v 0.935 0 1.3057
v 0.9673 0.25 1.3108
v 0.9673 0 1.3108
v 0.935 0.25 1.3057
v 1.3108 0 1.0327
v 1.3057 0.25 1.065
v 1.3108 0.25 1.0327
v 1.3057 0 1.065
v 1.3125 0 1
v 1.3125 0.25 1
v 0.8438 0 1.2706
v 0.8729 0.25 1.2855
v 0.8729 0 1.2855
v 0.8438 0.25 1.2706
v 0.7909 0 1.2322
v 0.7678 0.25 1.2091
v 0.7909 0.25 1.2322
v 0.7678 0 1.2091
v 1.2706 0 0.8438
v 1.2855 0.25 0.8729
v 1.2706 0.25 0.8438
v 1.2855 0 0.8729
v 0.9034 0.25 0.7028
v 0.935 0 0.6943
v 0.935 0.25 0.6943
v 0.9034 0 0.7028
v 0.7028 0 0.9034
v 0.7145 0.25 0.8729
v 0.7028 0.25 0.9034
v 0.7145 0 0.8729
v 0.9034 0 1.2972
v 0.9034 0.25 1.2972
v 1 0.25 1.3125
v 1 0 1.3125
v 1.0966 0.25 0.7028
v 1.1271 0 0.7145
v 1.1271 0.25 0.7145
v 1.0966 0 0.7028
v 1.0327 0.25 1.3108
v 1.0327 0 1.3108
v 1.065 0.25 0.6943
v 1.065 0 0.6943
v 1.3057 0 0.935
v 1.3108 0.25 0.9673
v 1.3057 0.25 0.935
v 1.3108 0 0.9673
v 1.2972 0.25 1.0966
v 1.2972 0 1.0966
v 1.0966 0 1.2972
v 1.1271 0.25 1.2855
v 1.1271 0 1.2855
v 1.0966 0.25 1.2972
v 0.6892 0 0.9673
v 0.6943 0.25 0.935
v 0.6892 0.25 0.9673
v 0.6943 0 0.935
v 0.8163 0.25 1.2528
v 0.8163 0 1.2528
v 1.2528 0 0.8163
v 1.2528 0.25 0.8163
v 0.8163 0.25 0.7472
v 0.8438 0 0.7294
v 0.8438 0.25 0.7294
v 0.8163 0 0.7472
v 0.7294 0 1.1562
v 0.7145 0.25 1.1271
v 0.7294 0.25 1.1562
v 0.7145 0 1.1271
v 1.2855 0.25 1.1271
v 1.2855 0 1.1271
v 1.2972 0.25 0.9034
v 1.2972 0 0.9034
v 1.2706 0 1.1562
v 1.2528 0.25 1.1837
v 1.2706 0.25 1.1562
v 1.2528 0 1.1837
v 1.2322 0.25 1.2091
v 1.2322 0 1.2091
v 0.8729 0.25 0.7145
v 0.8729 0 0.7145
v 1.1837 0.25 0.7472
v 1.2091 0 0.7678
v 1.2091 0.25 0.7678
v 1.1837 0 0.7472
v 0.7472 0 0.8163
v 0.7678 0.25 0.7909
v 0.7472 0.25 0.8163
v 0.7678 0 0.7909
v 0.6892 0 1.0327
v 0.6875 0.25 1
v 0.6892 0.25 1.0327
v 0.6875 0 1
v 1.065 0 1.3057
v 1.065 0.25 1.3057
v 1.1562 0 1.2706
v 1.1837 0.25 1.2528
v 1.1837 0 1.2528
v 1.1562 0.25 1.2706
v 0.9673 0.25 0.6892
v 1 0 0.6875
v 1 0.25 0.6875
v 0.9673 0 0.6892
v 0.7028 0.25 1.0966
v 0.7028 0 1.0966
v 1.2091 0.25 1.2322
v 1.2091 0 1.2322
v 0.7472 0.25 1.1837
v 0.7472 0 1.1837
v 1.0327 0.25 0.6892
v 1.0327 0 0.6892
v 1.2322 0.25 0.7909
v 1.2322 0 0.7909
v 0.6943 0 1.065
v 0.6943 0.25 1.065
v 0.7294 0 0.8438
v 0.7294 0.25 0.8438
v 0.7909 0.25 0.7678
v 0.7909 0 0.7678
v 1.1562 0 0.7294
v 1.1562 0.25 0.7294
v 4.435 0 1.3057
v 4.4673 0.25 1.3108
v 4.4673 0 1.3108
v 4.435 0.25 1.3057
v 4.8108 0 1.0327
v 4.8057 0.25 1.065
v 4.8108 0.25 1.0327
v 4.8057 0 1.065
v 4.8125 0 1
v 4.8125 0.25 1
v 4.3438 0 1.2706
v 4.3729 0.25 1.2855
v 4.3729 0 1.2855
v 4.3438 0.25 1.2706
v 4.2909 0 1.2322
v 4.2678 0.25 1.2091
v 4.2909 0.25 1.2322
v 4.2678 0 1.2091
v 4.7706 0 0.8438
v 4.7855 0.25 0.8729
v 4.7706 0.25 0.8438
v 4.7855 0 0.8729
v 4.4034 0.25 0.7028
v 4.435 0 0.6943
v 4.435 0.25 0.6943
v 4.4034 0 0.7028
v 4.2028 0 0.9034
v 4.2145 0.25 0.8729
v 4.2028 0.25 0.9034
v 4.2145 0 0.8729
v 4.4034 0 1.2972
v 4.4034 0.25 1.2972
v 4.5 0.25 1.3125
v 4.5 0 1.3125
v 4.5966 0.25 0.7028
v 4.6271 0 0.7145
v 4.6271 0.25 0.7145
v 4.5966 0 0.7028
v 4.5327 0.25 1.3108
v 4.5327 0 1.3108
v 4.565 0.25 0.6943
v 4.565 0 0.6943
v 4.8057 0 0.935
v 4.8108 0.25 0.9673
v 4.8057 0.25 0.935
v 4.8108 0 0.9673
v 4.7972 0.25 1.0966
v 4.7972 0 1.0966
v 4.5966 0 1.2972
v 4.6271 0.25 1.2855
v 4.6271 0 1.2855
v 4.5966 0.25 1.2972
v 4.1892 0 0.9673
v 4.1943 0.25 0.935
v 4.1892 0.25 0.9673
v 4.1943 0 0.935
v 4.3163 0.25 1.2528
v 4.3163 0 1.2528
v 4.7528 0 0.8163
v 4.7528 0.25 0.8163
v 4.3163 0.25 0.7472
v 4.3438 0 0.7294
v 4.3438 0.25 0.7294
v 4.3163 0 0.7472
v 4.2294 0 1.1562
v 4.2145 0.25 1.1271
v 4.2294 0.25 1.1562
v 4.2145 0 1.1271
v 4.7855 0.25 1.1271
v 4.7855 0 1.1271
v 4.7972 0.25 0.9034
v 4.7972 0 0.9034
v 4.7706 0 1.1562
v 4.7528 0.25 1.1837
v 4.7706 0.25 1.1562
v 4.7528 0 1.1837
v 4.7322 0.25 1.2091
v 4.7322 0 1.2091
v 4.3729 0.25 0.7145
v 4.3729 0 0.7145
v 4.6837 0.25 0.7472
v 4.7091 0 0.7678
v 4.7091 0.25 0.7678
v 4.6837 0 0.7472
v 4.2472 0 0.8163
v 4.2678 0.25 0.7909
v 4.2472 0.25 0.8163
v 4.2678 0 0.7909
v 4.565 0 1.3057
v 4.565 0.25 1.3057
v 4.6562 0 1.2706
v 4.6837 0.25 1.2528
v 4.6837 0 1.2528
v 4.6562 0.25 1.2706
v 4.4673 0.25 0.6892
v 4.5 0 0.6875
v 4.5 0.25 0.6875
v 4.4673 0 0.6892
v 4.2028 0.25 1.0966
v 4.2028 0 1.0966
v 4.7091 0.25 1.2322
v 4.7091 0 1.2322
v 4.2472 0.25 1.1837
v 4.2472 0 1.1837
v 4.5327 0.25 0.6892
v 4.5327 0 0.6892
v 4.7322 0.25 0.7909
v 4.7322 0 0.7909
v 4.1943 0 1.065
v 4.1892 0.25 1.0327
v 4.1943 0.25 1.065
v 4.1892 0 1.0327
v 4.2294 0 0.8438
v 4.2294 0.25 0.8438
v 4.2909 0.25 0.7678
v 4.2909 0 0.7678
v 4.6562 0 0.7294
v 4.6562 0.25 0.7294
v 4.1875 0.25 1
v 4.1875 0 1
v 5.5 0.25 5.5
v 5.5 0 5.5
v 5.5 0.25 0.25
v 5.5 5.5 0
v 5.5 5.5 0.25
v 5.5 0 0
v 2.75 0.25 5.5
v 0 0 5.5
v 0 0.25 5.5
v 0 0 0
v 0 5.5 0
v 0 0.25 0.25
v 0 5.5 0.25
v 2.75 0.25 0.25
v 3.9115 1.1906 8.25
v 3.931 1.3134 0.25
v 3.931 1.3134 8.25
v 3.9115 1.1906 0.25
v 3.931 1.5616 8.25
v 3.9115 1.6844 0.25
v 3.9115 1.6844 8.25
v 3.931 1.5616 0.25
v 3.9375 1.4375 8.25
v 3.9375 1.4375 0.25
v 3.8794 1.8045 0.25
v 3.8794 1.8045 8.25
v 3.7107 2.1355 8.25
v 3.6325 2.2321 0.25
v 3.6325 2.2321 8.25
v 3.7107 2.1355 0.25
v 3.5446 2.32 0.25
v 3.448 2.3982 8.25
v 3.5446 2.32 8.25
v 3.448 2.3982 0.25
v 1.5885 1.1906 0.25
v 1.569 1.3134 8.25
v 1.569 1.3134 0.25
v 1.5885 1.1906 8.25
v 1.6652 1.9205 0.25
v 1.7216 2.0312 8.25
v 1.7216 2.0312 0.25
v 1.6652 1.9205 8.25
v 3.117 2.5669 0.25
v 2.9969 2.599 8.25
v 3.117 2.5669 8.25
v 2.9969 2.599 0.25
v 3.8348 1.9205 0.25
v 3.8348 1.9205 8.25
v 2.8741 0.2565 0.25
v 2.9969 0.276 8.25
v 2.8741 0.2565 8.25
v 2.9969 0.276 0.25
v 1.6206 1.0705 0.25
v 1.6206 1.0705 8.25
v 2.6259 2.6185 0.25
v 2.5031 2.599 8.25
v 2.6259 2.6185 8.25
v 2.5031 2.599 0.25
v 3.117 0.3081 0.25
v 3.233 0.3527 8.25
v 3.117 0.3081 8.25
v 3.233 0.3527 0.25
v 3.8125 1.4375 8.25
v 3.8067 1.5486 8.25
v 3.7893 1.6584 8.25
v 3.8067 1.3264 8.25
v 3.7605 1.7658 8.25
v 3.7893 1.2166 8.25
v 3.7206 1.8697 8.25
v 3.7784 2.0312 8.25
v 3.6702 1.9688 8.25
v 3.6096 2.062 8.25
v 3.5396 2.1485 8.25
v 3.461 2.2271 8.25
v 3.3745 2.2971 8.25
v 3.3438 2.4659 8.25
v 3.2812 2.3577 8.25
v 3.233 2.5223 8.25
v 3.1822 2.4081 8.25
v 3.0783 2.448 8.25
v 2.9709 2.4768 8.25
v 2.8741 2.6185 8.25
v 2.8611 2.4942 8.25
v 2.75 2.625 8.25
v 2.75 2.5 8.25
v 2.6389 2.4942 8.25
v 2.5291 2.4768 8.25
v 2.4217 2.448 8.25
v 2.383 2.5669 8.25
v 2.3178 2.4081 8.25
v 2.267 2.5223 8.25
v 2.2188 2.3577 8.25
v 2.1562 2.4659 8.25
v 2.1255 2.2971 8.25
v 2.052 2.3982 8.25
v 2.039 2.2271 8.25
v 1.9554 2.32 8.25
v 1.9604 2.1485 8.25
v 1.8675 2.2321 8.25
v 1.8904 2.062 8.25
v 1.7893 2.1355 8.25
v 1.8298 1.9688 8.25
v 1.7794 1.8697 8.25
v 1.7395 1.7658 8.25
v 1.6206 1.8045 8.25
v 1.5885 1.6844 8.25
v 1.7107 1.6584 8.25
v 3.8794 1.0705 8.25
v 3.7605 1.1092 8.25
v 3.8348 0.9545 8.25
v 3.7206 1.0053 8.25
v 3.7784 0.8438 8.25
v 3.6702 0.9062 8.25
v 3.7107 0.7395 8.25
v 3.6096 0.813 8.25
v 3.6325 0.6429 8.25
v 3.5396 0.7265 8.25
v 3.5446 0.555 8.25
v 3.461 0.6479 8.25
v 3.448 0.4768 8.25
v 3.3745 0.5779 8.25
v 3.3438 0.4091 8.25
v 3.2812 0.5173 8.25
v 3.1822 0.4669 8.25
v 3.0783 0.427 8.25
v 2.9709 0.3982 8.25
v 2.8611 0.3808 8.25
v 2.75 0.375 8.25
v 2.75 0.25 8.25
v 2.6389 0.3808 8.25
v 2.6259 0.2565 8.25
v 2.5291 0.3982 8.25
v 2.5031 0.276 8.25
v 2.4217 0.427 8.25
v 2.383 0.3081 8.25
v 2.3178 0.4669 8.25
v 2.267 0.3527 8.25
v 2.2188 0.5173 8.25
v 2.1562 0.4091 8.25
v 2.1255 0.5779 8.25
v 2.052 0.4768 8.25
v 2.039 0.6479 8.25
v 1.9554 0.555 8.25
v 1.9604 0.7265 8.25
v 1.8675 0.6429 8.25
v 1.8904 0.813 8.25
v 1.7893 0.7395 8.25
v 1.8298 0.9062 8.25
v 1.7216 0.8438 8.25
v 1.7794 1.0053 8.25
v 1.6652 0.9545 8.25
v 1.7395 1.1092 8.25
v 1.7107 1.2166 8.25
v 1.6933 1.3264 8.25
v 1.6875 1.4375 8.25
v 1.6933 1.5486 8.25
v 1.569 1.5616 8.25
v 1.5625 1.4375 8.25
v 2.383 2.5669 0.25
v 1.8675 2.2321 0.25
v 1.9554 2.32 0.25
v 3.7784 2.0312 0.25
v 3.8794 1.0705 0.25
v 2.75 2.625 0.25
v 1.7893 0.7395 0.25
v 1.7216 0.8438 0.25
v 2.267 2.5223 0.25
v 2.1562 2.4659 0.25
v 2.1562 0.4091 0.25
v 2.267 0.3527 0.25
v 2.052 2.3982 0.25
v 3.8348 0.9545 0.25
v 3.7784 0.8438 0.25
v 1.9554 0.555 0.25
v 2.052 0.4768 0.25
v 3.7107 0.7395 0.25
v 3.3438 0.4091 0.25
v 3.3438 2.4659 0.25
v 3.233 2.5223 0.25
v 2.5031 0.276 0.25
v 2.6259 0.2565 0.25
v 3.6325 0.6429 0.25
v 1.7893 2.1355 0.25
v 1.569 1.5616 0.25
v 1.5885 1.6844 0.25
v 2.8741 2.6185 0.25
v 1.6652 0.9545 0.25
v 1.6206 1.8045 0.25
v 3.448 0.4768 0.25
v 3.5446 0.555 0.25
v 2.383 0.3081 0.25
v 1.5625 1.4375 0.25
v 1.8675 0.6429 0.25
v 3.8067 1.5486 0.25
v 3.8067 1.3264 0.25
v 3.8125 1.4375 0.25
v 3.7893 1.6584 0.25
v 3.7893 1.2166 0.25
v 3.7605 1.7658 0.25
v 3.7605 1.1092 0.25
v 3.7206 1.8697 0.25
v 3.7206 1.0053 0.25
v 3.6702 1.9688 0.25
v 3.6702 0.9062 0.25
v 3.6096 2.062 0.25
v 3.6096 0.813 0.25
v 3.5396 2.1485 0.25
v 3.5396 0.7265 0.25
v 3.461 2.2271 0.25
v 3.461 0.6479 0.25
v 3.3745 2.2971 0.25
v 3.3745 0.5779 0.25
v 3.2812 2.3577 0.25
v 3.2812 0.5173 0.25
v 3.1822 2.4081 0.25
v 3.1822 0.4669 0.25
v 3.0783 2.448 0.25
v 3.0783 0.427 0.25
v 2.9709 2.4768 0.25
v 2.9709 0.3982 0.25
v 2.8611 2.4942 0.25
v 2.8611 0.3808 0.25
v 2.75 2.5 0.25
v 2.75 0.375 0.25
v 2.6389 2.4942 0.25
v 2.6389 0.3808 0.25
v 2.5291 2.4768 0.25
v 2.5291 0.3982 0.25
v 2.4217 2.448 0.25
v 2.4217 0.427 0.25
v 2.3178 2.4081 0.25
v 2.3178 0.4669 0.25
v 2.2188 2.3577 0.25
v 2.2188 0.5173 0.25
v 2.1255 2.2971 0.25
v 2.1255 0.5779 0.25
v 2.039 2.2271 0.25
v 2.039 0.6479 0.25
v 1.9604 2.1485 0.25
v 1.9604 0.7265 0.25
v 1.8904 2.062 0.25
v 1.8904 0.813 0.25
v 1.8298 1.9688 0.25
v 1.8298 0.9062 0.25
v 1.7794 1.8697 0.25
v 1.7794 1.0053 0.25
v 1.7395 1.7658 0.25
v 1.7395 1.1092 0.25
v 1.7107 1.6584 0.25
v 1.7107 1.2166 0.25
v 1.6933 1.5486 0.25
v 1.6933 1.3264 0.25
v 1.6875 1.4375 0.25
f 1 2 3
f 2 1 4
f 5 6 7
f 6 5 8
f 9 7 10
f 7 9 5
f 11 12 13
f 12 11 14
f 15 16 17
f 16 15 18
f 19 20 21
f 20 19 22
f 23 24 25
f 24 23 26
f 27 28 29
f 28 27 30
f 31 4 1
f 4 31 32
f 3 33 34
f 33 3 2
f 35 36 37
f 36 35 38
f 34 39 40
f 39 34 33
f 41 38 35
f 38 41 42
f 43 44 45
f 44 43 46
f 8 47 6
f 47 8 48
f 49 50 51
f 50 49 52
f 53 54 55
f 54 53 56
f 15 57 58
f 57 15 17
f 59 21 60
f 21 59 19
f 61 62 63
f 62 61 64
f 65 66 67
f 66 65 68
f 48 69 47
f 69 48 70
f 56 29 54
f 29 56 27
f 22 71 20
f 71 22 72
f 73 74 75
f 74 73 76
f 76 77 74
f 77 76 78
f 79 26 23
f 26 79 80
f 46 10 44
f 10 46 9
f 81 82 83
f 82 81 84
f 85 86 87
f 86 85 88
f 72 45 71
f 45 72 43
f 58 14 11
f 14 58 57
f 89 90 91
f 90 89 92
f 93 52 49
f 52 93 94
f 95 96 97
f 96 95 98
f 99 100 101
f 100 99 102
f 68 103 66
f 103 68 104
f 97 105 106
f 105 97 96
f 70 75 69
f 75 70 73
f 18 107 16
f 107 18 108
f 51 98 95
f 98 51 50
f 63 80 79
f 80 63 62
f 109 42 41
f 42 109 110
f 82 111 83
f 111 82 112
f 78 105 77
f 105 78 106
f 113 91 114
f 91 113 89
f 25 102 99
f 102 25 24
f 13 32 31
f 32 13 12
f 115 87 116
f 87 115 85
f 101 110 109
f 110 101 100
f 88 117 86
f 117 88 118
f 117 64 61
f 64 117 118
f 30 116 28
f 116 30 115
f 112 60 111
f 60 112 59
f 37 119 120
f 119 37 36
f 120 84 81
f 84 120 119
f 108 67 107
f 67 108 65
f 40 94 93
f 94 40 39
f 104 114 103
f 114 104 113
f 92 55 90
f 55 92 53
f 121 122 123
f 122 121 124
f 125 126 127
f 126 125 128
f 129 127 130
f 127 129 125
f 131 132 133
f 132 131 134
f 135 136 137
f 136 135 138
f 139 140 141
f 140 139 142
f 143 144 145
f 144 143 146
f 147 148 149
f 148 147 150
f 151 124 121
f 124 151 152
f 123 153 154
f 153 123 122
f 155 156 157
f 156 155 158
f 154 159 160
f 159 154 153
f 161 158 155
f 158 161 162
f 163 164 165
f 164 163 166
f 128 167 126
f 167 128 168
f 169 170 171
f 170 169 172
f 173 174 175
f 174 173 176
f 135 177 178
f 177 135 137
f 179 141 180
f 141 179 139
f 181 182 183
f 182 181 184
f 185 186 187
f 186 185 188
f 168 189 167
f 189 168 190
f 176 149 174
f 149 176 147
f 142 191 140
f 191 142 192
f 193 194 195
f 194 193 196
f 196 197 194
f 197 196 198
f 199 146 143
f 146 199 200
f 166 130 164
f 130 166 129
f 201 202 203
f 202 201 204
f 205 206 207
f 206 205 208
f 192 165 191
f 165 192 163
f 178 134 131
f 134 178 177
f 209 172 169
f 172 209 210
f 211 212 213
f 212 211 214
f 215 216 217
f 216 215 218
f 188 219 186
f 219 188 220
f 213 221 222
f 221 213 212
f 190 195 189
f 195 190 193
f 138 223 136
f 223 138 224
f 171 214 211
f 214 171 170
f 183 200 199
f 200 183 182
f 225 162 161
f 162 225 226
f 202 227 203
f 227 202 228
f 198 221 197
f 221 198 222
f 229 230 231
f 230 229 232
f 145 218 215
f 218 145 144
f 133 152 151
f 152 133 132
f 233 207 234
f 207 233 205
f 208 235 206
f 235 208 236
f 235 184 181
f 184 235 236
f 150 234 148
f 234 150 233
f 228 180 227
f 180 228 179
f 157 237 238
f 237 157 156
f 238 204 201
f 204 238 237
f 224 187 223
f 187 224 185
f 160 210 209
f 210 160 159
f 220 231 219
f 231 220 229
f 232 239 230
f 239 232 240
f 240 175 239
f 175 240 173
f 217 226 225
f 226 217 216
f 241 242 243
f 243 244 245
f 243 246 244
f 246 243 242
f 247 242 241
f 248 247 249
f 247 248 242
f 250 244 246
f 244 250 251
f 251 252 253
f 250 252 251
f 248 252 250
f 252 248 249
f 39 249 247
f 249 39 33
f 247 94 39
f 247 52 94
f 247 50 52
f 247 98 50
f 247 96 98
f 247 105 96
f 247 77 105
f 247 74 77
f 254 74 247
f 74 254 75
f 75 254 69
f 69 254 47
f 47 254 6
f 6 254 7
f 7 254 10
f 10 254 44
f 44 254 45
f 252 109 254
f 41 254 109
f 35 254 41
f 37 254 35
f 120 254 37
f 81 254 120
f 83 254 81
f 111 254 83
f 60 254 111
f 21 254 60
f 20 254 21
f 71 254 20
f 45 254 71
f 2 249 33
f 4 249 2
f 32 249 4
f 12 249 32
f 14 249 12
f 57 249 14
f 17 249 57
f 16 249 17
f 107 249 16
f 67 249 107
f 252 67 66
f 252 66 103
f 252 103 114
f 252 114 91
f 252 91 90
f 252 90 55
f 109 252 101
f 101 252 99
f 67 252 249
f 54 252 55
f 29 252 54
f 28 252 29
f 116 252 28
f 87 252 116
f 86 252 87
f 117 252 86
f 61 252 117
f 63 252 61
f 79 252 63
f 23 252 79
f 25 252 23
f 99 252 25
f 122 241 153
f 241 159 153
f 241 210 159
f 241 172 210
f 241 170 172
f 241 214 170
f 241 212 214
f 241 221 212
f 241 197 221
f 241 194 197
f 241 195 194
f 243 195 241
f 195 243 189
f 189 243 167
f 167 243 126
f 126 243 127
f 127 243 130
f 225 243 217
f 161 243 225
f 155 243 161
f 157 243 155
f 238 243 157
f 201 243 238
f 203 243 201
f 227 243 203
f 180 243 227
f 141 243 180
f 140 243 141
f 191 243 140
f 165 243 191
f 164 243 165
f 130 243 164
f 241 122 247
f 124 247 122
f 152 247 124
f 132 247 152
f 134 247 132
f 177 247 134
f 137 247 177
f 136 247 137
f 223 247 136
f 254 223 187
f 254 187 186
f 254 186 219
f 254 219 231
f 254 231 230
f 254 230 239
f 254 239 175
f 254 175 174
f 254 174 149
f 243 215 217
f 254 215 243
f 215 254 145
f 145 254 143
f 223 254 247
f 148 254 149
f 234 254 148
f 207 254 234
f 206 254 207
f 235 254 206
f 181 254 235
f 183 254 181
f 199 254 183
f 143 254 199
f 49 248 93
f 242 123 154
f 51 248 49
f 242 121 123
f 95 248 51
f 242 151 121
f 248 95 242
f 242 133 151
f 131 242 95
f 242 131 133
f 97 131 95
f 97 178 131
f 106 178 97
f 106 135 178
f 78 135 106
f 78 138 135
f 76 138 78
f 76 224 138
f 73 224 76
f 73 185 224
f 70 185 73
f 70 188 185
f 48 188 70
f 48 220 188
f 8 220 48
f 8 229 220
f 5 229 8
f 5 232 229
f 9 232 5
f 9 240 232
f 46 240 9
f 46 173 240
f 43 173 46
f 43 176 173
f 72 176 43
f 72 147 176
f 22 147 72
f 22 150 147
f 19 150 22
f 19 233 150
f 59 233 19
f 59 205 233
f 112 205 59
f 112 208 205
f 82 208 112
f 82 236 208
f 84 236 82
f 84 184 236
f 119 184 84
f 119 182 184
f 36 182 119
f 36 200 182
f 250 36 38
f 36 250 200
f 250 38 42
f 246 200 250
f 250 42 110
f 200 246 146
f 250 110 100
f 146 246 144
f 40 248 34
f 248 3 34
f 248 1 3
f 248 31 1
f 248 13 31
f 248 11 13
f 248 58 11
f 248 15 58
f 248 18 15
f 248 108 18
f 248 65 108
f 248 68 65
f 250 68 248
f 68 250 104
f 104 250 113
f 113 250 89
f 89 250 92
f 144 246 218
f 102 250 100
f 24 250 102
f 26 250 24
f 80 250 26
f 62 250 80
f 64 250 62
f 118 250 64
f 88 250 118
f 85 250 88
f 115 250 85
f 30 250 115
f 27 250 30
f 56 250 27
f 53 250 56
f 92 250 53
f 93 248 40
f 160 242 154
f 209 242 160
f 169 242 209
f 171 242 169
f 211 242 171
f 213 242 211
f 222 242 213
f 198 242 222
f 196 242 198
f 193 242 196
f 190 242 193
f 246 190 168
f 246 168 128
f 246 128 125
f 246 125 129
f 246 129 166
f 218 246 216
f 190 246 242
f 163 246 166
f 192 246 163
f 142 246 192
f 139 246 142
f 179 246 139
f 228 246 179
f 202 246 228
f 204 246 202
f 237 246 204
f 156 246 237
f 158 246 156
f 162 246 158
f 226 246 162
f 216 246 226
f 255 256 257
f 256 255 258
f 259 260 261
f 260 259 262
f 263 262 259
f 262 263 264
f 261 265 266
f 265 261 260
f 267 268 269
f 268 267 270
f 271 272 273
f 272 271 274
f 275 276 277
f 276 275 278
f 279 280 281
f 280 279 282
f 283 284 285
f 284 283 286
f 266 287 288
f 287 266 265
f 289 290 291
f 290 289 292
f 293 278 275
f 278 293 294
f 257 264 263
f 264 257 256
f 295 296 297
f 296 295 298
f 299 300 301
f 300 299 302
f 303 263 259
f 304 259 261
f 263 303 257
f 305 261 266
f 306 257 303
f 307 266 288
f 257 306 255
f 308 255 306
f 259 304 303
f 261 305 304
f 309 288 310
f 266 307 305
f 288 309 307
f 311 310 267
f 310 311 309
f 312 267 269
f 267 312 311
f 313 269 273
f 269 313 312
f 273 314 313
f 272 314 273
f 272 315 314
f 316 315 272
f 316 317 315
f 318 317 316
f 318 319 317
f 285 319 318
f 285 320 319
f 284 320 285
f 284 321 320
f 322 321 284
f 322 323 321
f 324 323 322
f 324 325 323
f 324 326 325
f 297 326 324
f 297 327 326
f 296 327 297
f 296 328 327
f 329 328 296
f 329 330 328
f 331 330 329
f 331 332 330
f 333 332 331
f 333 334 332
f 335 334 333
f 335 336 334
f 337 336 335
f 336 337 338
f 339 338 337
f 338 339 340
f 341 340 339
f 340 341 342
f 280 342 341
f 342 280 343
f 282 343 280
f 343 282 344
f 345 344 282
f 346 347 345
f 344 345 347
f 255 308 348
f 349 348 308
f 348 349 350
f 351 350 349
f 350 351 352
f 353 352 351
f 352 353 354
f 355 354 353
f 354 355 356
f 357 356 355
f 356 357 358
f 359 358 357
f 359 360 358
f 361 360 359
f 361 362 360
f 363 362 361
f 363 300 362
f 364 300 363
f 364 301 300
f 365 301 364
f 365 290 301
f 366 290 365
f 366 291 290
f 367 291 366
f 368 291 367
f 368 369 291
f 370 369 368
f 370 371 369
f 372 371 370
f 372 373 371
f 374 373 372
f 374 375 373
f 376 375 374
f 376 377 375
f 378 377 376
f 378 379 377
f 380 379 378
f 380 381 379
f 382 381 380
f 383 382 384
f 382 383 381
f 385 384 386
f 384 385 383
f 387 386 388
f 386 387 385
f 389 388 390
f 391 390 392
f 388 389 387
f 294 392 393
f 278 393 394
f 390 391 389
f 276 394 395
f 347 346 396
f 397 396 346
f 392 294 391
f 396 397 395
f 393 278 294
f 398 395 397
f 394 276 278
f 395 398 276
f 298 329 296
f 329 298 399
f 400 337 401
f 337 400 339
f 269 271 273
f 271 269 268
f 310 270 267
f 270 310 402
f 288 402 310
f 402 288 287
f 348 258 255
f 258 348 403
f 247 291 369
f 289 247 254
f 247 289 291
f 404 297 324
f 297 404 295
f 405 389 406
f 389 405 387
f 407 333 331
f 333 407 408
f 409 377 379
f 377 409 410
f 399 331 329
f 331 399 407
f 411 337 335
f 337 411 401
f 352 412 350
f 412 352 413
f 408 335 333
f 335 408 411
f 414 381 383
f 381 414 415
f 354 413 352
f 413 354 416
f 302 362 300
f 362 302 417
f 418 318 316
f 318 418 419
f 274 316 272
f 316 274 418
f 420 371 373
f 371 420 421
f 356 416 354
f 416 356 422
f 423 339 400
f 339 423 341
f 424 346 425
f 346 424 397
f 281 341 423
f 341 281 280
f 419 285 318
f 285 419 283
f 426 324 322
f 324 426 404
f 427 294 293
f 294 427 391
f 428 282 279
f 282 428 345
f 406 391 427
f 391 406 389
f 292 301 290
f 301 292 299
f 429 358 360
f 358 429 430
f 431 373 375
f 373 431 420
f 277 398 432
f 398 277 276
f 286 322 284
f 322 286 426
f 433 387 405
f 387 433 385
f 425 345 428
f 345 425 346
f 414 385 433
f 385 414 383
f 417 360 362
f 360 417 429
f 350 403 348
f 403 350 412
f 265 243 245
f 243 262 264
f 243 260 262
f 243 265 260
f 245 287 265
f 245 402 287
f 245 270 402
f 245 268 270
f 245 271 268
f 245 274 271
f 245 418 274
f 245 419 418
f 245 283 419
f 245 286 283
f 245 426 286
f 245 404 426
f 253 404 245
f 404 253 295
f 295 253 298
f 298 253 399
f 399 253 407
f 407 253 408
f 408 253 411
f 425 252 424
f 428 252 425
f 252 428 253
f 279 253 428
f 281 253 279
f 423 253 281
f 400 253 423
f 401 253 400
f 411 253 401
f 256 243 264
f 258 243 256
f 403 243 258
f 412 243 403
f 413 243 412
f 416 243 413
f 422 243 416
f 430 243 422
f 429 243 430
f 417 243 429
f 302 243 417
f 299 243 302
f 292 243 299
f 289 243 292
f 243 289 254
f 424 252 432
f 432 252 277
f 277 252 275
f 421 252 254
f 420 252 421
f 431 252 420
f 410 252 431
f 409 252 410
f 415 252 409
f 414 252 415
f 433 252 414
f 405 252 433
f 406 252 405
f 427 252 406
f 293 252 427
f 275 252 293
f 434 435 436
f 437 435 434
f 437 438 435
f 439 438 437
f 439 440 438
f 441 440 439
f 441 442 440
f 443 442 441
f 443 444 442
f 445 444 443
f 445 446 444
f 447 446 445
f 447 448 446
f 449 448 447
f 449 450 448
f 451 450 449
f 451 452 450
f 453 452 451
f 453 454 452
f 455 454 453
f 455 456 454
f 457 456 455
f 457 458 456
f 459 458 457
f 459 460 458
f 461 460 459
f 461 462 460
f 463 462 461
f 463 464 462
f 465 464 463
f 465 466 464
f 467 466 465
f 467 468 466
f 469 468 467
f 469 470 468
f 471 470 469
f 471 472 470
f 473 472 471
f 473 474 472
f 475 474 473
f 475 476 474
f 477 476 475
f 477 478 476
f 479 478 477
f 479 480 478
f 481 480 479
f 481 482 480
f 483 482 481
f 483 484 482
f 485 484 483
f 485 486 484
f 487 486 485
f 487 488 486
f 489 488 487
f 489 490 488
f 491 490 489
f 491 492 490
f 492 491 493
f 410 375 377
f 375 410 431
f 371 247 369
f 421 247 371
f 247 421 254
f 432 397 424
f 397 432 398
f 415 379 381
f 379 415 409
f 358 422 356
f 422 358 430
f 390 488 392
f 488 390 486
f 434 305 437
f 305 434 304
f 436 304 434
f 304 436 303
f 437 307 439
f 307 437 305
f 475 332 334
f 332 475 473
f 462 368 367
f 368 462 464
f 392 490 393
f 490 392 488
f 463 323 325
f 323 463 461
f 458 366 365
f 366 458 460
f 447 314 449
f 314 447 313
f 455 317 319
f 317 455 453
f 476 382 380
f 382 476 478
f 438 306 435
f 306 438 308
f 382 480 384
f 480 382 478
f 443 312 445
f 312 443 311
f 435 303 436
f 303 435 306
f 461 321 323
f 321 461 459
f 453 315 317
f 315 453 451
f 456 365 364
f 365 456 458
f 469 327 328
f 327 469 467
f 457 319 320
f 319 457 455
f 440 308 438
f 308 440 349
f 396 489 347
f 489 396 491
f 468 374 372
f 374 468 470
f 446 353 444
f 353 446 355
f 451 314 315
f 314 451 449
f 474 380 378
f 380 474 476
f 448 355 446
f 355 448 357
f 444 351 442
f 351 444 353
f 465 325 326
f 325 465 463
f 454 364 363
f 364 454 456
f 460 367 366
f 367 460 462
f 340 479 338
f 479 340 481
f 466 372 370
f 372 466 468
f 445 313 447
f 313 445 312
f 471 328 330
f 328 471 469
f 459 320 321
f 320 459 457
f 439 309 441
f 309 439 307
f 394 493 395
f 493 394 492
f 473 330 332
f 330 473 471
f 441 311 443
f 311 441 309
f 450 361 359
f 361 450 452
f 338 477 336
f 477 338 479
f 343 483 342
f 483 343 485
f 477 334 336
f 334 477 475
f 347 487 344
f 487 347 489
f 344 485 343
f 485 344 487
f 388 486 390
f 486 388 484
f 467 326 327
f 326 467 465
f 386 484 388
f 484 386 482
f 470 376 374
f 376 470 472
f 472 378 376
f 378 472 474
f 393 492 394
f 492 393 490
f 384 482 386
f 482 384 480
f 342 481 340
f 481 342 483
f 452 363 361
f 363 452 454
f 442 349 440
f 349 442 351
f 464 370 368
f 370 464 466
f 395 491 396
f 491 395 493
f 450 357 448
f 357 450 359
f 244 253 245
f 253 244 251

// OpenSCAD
//2 1/8 inch inside diameter
//3 1/2 inch on center for bolts
//8 inch height

$fn = 60;

cylinder_height = 8;
inside_diameter = 2.125;
pipe_thickness = 0.125;
metal_thickness = .25;
bolt_hole_distance = 3.5;
bolt_hole_diameter = 5*0.125;

module pipe(){
    difference(){
        union(){
            cylinder(h=cylinder_height, d=(inside_diameter+2*pipe_thickness));
        };
        union(){
            translate([0,0,-.01]) cylinder(h=cylinder_height+.02, d=inside_diameter);
        };
    };
}

module base_plate(){
    difference(){
        union(){
            cube([bolt_hole_distance+2,bolt_hole_distance+2-metal_thickness,metal_thickness]);
        };
        union(){
        };
    };
}

module back_plate(){
    difference(){
        union(){
            cube([bolt_hole_distance+2,metal_thickness,bolt_hole_distance+2]);
        };
        union(){
            translate([1,metal_thickness*1.5,1]) rotate([90,0,0]) cylinder(d=bolt_hole_diameter, h=2*metal_thickness);
            translate([1+bolt_hole_distance,metal_thickness*1.5,1]) rotate([90,0,0]) cylinder(d=bolt_hole_diameter, h=2*metal_thickness);
        };
    };
}

module gusset(){
    difference(){
        union(){
            polyhedron(points=[[0,0,0], [bolt_hole_distance+2-metal_thickness,0,0], [0,bolt_hole_distance+2-metal_thickness,0],[0,0,metal_thickness], [bolt_hole_distance+2-metal_thickness,0,metal_thickness], [0,bolt_hole_distance+2-metal_thickness,metal_thickness]], faces=[[0,1,2], [3,4,5], [0,1,3], [1,3,4], [1,2,4], [2,4,5], [0,2,5], [0,3,5]]);
        };
        union(){
        };
    };
}

module completed_piece(){
    back_plate();
    translate([(bolt_hole_distance+2)/2,(pipe_thickness*2+inside_diameter)/2+metal_thickness,metal_thickness]) pipe();
    translate([0,metal_thickness,0]) base_plate();
    translate([(bolt_hole_distance+2)/2-(inside_diameter+2*pipe_thickness)/2,metal_thickness,metal_thickness]) rotate([0,-90,0]) gusset();
    translate([(bolt_hole_distance+2)/2+(inside_diameter+2*pipe_thickness)/2+metal_thickness, metal_thickness,metal_thickness]) rotate([0,-90,0]) gusset();
}

completed_piece();
